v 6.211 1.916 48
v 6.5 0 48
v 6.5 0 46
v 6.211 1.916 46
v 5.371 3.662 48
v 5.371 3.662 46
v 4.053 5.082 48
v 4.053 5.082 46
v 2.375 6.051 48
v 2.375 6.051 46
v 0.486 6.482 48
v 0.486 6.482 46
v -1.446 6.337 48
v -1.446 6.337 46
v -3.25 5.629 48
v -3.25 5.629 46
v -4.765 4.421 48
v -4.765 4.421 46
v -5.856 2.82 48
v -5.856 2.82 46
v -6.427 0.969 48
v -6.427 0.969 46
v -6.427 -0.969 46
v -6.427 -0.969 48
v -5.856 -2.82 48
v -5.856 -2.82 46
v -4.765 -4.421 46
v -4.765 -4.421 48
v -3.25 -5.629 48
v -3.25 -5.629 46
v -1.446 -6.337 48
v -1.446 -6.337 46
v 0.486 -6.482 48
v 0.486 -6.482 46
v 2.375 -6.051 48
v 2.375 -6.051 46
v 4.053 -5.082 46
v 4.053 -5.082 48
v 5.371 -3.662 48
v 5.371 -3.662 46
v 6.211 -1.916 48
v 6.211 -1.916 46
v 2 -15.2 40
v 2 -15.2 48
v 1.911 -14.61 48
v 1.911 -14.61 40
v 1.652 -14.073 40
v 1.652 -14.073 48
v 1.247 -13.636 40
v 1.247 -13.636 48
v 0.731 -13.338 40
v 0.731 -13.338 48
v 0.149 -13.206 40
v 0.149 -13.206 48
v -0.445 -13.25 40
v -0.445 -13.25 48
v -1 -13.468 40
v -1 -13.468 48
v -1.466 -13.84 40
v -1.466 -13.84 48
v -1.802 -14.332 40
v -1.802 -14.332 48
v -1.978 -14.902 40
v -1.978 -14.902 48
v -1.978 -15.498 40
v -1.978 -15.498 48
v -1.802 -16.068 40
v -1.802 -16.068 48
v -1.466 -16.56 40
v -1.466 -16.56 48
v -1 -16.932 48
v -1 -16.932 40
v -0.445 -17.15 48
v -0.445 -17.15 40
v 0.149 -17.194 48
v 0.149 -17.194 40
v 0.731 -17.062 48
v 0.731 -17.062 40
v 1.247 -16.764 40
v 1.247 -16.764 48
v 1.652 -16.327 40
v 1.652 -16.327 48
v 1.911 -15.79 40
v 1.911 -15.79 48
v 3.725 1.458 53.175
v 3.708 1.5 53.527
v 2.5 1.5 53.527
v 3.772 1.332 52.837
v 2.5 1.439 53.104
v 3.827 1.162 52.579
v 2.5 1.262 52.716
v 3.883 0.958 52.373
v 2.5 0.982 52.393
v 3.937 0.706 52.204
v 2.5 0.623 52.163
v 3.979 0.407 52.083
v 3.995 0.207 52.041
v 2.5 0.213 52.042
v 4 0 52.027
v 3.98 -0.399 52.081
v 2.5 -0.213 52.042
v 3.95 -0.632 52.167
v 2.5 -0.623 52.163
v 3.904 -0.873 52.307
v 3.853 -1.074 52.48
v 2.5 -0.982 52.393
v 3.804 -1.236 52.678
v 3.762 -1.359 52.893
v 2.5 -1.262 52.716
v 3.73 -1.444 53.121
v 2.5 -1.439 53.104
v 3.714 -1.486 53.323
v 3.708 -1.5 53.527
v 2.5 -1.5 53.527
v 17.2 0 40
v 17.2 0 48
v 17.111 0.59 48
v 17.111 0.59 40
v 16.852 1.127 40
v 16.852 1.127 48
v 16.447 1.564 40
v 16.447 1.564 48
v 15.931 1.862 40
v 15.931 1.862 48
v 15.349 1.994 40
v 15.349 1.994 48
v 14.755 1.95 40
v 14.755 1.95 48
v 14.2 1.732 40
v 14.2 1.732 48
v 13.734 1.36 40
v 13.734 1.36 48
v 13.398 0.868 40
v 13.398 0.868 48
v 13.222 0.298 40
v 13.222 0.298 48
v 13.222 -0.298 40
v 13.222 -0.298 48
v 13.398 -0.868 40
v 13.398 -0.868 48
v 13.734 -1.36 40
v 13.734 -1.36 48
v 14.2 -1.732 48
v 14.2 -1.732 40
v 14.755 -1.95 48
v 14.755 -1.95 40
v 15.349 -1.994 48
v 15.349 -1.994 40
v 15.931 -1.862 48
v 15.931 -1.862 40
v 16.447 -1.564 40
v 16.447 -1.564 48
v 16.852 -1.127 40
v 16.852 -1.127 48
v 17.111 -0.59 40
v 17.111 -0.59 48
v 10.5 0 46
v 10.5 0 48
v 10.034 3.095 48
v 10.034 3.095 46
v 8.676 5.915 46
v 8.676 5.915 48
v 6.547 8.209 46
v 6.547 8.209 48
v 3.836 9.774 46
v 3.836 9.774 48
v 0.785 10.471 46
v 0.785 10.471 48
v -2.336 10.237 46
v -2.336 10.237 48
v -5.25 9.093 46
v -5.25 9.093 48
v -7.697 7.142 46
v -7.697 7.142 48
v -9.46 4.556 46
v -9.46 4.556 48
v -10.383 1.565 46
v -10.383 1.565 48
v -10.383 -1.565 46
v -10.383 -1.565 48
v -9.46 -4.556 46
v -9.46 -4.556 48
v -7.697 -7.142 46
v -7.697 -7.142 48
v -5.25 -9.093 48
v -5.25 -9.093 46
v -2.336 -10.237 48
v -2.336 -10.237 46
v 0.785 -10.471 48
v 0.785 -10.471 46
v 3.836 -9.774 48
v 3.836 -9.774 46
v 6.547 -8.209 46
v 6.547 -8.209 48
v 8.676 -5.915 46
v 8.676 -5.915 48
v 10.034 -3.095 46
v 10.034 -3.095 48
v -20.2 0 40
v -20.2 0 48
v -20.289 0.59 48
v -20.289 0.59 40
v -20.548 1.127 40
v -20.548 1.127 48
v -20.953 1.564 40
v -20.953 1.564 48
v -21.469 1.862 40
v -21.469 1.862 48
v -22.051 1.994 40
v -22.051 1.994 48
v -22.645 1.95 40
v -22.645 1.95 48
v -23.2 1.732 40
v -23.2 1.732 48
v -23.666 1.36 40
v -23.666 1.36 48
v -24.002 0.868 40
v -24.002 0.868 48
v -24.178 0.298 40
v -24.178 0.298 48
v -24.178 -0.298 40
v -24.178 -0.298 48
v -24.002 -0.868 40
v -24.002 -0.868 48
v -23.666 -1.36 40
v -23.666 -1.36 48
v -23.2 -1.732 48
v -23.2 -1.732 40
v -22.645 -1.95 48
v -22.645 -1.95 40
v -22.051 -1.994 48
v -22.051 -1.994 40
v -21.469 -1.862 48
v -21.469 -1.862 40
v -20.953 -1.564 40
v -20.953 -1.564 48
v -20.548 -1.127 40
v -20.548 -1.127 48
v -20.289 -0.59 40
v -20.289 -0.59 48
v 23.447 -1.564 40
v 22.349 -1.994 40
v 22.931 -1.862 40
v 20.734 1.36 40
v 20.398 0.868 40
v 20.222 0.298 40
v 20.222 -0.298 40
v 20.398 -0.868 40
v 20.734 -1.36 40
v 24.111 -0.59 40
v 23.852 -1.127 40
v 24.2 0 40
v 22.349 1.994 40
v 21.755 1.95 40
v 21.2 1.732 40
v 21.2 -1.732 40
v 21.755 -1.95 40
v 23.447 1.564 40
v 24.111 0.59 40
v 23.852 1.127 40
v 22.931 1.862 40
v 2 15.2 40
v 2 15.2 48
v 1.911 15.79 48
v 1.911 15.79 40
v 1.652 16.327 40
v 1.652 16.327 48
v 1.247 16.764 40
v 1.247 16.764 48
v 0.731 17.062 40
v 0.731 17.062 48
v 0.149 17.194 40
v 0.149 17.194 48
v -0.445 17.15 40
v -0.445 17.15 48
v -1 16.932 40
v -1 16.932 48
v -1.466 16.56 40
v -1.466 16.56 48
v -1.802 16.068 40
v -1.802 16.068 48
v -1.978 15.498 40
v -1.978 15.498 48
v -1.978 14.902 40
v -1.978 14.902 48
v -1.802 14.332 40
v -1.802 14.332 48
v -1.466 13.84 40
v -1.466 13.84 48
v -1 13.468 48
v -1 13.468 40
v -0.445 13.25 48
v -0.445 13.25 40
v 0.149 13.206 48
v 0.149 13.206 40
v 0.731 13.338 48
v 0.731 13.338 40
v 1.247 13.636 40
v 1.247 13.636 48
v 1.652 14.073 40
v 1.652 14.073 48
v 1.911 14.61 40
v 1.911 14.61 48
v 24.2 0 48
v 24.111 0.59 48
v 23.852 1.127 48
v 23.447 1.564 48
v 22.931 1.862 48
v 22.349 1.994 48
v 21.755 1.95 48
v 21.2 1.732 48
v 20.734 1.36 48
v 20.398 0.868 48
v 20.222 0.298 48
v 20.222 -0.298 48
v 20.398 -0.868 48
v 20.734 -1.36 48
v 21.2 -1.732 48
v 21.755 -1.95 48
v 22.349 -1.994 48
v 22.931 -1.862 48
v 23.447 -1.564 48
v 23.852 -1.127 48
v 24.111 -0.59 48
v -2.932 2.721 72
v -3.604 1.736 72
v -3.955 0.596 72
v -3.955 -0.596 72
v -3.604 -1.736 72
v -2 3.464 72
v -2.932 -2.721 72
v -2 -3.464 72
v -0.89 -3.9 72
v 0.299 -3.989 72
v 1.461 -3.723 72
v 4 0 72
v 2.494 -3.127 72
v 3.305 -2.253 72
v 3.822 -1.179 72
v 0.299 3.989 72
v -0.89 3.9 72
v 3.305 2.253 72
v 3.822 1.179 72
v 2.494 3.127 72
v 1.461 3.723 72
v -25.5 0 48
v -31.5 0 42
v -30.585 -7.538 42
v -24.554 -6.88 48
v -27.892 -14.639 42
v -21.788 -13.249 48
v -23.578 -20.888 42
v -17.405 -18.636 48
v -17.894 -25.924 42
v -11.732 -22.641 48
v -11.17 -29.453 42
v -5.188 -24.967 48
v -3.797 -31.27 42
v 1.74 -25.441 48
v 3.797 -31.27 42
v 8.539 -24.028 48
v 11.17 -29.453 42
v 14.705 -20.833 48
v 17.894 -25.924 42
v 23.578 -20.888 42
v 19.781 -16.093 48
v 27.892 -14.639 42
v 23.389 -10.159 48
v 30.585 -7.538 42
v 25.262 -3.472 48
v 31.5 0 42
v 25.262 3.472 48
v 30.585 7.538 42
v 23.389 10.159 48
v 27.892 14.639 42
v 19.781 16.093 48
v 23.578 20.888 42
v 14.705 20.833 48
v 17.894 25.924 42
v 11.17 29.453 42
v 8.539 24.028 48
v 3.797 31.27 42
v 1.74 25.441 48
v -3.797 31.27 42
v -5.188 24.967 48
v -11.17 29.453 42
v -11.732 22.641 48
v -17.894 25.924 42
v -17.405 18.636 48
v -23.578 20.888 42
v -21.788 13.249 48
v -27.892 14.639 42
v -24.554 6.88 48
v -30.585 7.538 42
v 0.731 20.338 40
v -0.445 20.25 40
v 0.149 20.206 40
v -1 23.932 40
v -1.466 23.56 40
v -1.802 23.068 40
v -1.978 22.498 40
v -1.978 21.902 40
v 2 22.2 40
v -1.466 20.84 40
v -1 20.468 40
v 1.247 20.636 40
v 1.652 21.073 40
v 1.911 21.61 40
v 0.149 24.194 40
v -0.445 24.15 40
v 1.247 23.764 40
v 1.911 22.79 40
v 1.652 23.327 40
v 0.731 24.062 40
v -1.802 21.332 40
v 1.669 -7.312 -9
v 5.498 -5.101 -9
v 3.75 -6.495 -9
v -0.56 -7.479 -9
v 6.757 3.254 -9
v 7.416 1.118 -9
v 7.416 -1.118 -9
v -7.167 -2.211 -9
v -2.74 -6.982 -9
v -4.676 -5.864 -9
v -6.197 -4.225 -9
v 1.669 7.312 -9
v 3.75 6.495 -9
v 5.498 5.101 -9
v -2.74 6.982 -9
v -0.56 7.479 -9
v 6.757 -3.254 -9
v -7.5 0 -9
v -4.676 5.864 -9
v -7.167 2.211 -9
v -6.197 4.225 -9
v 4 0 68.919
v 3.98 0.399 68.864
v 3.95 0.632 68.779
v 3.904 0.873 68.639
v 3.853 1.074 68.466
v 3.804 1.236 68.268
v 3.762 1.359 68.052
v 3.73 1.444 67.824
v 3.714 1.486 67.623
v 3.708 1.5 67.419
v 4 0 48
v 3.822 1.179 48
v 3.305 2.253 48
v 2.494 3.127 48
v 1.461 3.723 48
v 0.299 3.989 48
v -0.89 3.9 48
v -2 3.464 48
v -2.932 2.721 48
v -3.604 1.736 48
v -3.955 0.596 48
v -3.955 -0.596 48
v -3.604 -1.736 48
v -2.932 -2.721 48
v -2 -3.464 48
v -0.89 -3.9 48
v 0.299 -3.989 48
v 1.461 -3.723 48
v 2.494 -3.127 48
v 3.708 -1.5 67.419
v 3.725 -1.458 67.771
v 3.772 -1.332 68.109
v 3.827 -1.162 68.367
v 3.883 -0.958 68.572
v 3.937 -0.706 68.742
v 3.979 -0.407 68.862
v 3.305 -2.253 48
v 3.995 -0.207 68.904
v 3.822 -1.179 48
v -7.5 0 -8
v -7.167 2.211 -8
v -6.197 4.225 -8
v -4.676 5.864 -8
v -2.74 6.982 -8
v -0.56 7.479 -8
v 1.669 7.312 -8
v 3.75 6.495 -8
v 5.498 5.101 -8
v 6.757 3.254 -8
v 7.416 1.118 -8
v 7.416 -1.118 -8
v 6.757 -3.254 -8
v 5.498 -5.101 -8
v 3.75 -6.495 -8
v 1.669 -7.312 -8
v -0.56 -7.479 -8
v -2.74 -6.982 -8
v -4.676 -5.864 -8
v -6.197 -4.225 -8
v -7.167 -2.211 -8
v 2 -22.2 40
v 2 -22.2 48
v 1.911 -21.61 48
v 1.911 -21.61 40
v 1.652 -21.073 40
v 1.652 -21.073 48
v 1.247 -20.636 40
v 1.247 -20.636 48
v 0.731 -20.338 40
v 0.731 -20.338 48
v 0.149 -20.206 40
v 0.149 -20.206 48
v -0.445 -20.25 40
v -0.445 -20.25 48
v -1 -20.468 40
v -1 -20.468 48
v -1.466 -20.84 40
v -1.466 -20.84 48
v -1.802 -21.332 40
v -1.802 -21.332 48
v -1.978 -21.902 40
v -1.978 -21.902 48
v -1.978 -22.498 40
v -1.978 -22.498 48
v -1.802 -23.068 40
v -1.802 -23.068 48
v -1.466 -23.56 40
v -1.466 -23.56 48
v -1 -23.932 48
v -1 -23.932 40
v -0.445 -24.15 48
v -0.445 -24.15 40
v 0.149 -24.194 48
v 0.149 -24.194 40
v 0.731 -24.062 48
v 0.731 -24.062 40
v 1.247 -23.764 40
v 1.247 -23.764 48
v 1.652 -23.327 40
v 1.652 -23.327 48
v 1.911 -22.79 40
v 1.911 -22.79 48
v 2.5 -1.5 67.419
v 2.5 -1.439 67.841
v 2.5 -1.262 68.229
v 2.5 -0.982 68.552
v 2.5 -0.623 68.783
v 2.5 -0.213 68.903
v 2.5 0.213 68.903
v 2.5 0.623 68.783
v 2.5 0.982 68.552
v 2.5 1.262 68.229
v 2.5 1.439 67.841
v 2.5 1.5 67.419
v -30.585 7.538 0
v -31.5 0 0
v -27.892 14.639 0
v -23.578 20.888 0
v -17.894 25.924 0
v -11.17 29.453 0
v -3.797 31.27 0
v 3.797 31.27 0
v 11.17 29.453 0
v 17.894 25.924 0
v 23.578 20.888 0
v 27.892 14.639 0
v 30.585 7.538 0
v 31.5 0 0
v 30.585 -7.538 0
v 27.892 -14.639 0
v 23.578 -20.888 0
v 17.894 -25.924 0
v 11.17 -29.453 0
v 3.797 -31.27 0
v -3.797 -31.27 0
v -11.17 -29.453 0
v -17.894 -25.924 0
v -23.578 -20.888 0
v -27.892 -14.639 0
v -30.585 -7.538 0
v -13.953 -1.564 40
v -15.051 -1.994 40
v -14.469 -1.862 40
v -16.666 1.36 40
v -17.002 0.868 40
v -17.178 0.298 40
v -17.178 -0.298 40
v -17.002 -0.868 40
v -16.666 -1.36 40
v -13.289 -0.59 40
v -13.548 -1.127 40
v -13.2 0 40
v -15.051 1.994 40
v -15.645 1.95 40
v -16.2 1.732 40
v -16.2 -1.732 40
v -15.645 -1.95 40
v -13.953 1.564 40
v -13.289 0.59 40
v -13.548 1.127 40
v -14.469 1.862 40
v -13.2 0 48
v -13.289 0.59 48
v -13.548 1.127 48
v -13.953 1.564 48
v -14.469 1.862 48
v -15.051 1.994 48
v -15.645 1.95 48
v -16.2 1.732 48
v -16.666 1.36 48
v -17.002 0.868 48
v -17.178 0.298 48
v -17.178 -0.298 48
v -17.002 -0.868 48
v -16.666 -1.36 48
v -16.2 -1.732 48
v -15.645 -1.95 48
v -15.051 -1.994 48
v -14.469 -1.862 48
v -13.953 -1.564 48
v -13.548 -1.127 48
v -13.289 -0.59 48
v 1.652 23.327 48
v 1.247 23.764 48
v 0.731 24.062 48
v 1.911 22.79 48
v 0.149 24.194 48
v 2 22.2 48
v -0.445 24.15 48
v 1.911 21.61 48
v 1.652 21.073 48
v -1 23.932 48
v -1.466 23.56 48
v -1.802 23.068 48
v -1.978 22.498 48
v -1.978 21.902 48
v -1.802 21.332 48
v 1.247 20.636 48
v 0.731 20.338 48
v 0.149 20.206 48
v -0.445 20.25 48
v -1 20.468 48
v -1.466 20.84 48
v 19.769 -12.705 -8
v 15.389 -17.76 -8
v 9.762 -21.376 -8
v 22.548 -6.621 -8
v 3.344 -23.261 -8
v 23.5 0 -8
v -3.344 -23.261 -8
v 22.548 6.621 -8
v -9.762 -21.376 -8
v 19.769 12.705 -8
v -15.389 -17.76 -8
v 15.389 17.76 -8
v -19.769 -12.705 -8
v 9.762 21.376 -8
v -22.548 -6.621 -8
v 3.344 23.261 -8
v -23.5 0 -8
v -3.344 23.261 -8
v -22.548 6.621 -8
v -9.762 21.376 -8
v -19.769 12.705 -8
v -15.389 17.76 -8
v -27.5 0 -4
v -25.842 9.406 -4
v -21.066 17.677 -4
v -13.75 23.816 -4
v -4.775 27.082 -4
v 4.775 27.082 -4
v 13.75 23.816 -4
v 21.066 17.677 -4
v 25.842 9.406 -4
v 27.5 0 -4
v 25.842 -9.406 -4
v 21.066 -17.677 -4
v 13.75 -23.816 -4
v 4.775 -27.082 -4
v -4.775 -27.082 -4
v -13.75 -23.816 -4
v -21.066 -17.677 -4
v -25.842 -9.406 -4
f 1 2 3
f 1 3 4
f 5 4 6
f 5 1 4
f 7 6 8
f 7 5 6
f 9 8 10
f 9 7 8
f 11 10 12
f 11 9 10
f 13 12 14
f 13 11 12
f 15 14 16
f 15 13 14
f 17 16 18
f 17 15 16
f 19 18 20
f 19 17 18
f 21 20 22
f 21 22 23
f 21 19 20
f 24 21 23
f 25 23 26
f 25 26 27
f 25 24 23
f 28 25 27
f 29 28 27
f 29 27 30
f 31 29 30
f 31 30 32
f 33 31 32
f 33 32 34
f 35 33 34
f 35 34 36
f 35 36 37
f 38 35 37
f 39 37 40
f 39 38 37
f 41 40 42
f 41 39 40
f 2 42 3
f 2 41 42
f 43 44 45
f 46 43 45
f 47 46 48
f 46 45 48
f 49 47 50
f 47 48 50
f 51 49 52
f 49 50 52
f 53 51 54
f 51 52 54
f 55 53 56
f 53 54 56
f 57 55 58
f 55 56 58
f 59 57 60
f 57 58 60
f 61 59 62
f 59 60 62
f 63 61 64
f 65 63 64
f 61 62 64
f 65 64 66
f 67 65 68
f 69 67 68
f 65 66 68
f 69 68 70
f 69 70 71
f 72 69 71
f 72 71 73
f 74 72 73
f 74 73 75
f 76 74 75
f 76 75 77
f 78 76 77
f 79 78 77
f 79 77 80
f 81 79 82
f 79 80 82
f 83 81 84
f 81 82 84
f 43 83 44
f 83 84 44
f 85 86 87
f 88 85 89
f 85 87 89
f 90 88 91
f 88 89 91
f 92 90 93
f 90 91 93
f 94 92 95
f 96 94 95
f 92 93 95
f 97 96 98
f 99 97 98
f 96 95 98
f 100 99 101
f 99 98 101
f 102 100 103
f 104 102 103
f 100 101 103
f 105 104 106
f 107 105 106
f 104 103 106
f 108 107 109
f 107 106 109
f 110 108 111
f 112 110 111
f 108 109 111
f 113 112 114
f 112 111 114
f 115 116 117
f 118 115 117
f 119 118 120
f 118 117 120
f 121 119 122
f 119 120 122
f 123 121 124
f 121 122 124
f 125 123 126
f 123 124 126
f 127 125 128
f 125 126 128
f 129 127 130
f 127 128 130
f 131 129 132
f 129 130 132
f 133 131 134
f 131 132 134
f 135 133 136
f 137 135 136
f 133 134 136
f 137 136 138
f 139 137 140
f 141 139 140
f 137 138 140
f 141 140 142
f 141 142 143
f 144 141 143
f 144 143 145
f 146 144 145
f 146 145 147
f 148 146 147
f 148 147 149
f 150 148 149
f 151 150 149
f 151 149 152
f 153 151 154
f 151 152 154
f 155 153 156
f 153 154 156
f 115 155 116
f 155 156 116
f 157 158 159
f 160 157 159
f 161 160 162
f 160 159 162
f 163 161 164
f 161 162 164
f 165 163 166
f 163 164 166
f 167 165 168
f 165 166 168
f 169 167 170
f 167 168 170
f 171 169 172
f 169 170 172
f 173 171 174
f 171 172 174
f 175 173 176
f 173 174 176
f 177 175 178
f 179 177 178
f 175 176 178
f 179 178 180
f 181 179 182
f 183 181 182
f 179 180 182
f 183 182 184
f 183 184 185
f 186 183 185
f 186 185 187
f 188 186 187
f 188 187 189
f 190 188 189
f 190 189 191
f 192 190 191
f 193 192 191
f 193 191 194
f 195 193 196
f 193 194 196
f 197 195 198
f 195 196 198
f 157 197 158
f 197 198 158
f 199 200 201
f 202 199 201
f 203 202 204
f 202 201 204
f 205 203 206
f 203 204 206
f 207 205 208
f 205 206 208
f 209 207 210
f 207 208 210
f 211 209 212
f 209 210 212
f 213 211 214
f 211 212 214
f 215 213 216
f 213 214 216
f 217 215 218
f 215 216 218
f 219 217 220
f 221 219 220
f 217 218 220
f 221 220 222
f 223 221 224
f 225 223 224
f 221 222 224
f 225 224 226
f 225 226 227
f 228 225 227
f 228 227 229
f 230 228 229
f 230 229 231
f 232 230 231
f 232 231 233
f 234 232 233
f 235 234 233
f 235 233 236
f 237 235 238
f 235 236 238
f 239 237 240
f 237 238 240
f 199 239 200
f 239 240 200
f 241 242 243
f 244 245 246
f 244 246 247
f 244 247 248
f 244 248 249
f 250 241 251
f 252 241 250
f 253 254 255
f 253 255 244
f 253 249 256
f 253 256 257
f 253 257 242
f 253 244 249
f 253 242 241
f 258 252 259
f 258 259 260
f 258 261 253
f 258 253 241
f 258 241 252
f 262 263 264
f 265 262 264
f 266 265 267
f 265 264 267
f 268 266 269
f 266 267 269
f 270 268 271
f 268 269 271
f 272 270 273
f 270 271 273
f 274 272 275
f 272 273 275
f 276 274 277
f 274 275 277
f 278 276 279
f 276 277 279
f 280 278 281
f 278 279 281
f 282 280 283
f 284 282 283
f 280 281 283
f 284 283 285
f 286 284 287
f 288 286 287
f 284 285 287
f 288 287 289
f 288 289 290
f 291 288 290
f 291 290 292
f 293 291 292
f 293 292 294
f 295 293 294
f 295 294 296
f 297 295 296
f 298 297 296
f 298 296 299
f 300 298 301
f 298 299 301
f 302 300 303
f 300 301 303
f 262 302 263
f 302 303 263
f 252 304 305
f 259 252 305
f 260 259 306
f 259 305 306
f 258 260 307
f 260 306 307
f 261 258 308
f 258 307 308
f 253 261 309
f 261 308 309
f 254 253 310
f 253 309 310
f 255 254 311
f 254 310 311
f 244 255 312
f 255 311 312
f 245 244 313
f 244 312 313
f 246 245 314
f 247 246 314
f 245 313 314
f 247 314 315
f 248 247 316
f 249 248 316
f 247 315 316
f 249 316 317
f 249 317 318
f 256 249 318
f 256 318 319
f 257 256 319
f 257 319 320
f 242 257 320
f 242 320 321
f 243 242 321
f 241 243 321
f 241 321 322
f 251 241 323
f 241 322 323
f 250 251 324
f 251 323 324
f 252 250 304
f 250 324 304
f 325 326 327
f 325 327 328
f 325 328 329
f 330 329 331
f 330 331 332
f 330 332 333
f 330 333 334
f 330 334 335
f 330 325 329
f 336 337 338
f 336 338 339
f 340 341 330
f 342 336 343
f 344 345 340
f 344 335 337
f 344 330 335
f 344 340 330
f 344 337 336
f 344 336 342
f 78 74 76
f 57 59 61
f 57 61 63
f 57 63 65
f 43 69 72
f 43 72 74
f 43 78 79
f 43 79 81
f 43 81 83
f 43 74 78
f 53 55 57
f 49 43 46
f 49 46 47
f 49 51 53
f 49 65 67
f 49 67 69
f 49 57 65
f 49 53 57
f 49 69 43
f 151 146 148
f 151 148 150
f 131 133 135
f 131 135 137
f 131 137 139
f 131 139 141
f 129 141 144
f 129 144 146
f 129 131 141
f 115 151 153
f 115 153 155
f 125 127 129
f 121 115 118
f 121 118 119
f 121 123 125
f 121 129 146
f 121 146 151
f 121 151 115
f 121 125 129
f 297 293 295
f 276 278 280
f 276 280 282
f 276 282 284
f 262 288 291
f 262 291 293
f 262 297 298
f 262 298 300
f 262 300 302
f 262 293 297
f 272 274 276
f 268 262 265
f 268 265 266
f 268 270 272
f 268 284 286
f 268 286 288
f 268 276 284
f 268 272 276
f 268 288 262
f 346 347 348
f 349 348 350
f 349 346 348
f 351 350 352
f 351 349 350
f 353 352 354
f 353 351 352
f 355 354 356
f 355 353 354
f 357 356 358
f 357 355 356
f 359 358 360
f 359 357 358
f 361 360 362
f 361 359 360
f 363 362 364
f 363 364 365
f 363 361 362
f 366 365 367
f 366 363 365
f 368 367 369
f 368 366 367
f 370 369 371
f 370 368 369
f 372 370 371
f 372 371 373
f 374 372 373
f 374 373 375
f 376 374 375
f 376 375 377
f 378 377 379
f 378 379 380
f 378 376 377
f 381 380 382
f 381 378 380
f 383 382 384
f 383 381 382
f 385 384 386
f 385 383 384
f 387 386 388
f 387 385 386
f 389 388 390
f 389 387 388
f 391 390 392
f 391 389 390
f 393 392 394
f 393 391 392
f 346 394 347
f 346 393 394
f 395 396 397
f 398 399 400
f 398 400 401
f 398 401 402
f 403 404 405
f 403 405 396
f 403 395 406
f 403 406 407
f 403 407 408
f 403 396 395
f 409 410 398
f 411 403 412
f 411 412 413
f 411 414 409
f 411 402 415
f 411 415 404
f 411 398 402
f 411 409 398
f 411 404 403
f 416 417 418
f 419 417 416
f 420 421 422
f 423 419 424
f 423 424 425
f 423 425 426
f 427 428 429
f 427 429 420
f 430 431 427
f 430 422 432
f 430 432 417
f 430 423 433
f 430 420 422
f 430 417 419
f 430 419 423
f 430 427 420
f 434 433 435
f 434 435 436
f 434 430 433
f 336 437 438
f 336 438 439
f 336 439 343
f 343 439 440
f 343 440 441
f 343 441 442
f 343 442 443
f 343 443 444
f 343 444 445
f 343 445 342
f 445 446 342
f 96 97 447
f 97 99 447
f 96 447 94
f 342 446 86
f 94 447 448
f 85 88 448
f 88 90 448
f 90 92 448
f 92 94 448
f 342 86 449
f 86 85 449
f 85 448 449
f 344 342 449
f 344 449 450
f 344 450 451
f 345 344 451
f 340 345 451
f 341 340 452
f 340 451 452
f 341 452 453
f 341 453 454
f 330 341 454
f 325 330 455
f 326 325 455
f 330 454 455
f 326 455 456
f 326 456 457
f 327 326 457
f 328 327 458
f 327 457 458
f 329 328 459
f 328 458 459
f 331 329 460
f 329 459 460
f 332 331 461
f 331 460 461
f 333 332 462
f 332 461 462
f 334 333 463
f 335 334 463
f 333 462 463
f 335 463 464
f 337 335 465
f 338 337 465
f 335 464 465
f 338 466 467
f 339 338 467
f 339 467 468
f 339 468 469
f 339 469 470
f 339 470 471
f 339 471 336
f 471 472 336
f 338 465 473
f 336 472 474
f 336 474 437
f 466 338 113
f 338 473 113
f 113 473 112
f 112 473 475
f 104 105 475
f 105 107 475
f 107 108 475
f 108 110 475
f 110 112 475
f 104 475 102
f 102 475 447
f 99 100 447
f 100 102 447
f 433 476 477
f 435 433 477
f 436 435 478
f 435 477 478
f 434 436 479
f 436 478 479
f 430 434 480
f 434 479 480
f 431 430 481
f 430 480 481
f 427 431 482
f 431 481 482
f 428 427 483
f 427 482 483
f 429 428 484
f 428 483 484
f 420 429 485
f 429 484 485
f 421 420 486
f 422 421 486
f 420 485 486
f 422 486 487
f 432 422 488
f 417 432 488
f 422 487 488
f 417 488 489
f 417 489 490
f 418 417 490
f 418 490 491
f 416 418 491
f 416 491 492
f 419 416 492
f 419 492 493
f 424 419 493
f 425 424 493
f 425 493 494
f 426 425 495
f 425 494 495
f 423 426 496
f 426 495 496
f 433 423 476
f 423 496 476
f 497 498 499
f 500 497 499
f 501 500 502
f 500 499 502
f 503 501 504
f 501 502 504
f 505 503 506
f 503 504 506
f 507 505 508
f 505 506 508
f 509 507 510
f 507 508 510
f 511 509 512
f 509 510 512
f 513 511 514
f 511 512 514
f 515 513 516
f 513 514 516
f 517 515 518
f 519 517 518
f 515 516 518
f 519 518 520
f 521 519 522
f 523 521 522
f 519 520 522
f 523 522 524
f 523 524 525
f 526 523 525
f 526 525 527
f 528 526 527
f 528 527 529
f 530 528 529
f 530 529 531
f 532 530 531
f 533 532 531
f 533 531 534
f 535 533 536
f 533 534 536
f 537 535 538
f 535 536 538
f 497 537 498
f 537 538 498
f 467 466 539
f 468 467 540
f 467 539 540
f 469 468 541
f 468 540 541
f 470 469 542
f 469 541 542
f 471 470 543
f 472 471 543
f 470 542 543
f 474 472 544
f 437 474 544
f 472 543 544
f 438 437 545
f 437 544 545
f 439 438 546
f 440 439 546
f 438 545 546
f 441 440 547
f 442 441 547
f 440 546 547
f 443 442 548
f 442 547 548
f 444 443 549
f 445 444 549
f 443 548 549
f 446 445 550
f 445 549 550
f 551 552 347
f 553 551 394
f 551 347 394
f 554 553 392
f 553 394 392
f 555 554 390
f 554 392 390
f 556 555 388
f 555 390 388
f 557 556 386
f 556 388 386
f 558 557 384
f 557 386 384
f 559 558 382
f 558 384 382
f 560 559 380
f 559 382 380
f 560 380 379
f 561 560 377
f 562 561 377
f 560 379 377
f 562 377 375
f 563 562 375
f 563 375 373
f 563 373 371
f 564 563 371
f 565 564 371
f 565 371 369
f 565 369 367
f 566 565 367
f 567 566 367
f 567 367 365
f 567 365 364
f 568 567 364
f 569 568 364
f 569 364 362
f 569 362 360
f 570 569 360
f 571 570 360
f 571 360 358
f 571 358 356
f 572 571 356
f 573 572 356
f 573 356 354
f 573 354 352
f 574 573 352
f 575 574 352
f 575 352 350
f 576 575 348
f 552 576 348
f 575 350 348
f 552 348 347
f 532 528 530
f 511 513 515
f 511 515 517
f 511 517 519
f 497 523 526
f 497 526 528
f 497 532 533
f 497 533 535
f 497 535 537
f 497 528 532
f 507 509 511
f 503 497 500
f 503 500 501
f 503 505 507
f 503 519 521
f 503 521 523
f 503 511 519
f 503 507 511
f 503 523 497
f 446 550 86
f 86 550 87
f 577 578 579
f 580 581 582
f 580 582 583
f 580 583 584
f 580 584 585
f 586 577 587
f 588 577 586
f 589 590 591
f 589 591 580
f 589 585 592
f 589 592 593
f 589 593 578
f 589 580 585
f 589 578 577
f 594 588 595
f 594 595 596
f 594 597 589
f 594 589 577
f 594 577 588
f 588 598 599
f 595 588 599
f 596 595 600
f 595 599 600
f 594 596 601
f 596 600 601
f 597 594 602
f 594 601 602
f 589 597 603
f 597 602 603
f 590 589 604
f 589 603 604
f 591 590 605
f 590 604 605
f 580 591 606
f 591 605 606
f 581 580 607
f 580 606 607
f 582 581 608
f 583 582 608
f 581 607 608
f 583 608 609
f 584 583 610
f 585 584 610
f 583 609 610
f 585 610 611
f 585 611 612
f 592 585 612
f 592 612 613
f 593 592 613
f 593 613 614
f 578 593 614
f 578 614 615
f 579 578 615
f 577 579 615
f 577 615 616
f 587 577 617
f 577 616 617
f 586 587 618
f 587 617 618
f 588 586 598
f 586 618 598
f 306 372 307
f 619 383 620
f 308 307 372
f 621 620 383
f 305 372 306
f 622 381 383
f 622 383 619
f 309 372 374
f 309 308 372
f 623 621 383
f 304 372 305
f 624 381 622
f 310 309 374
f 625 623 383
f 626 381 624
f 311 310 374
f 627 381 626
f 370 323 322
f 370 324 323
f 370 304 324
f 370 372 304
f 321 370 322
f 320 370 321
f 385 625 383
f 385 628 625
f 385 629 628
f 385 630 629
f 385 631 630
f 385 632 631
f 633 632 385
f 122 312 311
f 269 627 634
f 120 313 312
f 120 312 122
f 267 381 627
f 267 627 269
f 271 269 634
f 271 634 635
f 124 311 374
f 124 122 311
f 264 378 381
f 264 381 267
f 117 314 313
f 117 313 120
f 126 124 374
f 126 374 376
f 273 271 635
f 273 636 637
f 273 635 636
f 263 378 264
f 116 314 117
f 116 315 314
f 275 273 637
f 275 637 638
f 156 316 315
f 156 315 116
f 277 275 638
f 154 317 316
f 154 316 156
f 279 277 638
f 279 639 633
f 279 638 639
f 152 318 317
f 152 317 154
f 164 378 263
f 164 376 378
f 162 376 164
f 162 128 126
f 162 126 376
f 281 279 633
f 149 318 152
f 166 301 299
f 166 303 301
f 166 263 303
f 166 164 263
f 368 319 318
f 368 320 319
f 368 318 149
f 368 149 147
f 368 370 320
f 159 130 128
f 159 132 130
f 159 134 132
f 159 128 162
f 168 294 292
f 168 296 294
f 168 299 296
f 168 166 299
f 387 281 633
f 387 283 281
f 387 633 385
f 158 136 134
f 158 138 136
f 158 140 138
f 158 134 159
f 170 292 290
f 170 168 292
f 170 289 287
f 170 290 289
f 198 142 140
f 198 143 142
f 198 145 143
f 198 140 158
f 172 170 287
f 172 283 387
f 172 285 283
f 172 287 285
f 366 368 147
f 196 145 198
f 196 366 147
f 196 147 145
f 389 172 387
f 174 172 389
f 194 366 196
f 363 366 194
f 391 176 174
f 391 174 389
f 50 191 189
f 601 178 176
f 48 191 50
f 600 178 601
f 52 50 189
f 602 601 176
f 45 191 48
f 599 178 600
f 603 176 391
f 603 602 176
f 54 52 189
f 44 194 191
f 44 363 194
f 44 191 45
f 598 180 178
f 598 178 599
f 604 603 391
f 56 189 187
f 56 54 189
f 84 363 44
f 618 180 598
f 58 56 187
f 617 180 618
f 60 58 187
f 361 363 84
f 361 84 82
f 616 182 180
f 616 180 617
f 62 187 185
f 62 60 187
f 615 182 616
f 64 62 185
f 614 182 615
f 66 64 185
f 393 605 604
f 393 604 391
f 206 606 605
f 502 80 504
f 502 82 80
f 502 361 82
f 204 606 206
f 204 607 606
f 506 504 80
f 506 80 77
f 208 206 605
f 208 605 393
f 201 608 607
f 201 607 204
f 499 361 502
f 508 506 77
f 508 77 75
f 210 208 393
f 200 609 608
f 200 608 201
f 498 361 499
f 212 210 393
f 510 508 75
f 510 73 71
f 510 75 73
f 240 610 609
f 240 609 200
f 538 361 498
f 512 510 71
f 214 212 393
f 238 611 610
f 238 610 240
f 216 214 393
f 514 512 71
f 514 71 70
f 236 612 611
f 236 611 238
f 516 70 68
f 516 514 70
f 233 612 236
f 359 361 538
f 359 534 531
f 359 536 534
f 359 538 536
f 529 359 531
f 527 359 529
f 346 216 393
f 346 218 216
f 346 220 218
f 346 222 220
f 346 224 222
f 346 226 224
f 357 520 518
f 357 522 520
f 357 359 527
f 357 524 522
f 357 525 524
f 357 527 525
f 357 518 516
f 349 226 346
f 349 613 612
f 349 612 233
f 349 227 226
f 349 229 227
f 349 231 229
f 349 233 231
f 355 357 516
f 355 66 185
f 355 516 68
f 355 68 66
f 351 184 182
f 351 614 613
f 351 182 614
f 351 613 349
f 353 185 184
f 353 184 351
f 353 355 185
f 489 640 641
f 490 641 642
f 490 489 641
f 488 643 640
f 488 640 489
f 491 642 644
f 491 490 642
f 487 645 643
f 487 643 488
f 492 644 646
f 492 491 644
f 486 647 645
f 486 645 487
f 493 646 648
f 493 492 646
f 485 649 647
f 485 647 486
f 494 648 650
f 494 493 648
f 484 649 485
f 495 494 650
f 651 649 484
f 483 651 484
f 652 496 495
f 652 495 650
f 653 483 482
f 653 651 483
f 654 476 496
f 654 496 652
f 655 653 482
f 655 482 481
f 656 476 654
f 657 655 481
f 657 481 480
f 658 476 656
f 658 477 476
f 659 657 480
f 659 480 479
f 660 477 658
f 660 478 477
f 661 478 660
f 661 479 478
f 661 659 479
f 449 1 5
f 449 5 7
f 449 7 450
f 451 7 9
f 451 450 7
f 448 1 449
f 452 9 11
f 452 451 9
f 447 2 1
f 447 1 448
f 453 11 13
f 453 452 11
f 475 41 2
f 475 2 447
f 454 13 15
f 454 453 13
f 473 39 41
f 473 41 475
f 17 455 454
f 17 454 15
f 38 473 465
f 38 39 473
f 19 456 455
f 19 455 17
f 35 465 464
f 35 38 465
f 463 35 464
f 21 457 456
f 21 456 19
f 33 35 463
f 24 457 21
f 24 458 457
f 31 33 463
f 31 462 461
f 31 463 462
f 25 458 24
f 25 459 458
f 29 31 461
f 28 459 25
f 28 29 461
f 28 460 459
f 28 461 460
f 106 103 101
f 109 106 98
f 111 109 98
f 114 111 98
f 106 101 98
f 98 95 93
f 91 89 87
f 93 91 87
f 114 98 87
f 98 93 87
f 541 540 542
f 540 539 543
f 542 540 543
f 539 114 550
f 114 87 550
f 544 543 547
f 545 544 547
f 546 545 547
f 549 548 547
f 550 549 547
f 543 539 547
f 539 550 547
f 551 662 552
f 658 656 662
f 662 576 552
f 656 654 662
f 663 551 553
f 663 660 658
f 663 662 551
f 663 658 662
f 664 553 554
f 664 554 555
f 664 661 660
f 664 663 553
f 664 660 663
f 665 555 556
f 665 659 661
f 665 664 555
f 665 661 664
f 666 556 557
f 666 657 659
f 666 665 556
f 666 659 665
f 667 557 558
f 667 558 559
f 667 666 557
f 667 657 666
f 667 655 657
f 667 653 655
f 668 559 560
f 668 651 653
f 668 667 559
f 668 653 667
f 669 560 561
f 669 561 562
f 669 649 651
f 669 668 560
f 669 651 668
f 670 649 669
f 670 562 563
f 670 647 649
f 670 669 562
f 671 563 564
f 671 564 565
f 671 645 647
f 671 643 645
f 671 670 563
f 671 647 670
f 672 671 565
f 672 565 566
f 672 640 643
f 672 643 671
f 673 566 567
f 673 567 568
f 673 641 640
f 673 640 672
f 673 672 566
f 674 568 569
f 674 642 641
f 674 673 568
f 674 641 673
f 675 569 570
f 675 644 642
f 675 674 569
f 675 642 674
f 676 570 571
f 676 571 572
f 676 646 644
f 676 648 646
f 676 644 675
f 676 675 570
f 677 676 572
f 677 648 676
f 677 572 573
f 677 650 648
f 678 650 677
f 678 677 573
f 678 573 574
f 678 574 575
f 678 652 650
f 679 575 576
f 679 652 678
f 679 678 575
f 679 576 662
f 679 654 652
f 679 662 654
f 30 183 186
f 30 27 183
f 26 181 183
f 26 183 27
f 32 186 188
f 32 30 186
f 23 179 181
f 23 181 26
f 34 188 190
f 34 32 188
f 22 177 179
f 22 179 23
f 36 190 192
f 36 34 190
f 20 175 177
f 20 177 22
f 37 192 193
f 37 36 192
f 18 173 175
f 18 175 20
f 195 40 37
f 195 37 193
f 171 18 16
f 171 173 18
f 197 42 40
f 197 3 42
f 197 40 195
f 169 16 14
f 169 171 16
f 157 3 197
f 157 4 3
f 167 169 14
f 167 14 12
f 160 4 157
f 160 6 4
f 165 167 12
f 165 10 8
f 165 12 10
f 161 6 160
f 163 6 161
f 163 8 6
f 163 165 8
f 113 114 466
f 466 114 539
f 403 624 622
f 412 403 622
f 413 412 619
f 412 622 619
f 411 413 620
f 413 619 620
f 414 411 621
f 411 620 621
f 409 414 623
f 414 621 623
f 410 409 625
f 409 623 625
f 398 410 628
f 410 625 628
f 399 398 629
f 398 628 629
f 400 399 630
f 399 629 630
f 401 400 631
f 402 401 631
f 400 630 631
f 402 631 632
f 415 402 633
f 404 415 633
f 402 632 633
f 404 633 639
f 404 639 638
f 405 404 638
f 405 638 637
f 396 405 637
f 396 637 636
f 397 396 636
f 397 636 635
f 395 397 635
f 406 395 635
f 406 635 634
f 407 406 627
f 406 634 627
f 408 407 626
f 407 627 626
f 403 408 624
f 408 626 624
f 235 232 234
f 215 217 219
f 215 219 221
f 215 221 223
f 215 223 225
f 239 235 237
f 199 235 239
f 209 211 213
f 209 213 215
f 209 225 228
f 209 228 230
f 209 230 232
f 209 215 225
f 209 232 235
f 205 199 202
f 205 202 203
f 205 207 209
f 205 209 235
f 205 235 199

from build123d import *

# Parameters (mm, degrees)
SKETCH1_R           = 31.5
BOSS_EXTRUDE1_DEPTH = 42
SKETCH2_R           = 31.5
BOSS_EXTRUDE2_DEPTH = 6
CHAMFER1_SIZE       = 6
SKETCH4_R           = 31.5
BOSS_EXTRUDE3_DEPTH = 8
CHAMFER2_SIZE       = 8
SKETCH6_R           = 7.5
BOSS_EXTRUDE4_DEPTH = 1
SKETCH7_R           = 4
BOSS_EXTRUDE5_DEPTH = 24
SKETCH10_R          = 2
CUT_EXTRUDE4_DEPTH  = 8
CUT_EXTRUDE5_DEPTH  = 10
SKETCH12_R          = 10.5
SKETCH12_R_2        = 6.5
CUT_EXTRUDE6_DEPTH  = 2


with BuildPart() as part:
    # Sketch1 → Boss-Extrude1 (new body)
    with BuildSketch(Plane.XY):
        with Locations(Location((0, 0, 0), (0, 0, 180))):
            Circle(SKETCH1_R)
    extrude(amount=BOSS_EXTRUDE1_DEPTH)

    # Sketch2 → Boss-Extrude2 (add)
    with BuildSketch(Plane.XY.offset(42)):
        with Locations(Location((0, 0, 0), (0, 0, 180))):
            Circle(SKETCH2_R)
    extrude(amount=BOSS_EXTRUDE2_DEPTH)

    # Chamfer1
    chamfer1_edges = [part.edges().sort_by_distance(p)[0] for p in [
        (31.5, 0, 48),
    ]]
    chamfer(chamfer1_edges, length=CHAMFER1_SIZE)

    # Sketch4 → Boss-Extrude3 (add)
    with BuildSketch(Plane(origin=(0, 0, 0), x_dir=(-1, 0, 0), z_dir=(0, 0, -1))):
        Circle(SKETCH4_R)
    extrude(amount=BOSS_EXTRUDE3_DEPTH)

    # Chamfer2
    chamfer2_edges = [part.edges().sort_by_distance(p)[0] for p in [
        (31.5, 0, -8),
    ]]
    chamfer(chamfer2_edges, length=CHAMFER2_SIZE)

    # Sketch6 → Boss-Extrude4 (add)
    with BuildSketch(Plane(origin=(0, 0, -8), x_dir=(-1, 0, 0), z_dir=(0, 0, -1))):
        Circle(SKETCH6_R)
    extrude(amount=BOSS_EXTRUDE4_DEPTH)

    # Sketch7 → Boss-Extrude5 (add)
    with BuildSketch(Plane.XY.offset(48)):
        Circle(SKETCH7_R)
    extrude(amount=BOSS_EXTRUDE5_DEPTH)

    # Sketch10 → Cut-Extrude4 (cut)
    with BuildSketch(Plane.XY.offset(48)):
        with Locations((0, 15.2)):
            Circle(SKETCH10_R)
        with Locations((0, 22.2)):
            Circle(SKETCH10_R)
        with Locations((22.2, 0)):
            Circle(SKETCH10_R)
        with Locations((15.2, 0)):
            Circle(SKETCH10_R)
        with Locations((0, -22.2)):
            Circle(SKETCH10_R)
        with Locations((0, -15.2)):
            Circle(SKETCH10_R)
        with Locations((-22.2, 0)):
            Circle(SKETCH10_R)
        with Locations((-15.2, 0)):
            Circle(SKETCH10_R)
    extrude(amount=-CUT_EXTRUDE4_DEPTH, mode=Mode.SUBTRACT)

    # Sketch11 → Cut-Extrude5 (cut)
    with BuildSketch(Plane(origin=(2.5, 0, 0), x_dir=(0, 0, -1), z_dir=(1, 0, 0))):
        with BuildLine():
            Line((-67.418537693, 1.5), (-53.527084748, 1.5))
            ThreePointArc((-53.527084748, 1.5), (-52.027084748, 0), (-53.527084748, -1.5))
            Line((-53.527084748, -1.5), (-67.418537693, -1.5))
            ThreePointArc((-67.418537693, -1.5), (-68.918537693, 0), (-67.418537693, 1.5))
        make_face()
    extrude(amount=CUT_EXTRUDE5_DEPTH, mode=Mode.SUBTRACT)

    # Sketch12 → Cut-Extrude6 (cut)
    with BuildSketch(Plane.XY.offset(48)):
        Circle(SKETCH12_R)
        Circle(SKETCH12_R_2, mode=Mode.SUBTRACT)
    extrude(amount=-CUT_EXTRUDE6_DEPTH, mode=Mode.SUBTRACT)


solid = part.part
